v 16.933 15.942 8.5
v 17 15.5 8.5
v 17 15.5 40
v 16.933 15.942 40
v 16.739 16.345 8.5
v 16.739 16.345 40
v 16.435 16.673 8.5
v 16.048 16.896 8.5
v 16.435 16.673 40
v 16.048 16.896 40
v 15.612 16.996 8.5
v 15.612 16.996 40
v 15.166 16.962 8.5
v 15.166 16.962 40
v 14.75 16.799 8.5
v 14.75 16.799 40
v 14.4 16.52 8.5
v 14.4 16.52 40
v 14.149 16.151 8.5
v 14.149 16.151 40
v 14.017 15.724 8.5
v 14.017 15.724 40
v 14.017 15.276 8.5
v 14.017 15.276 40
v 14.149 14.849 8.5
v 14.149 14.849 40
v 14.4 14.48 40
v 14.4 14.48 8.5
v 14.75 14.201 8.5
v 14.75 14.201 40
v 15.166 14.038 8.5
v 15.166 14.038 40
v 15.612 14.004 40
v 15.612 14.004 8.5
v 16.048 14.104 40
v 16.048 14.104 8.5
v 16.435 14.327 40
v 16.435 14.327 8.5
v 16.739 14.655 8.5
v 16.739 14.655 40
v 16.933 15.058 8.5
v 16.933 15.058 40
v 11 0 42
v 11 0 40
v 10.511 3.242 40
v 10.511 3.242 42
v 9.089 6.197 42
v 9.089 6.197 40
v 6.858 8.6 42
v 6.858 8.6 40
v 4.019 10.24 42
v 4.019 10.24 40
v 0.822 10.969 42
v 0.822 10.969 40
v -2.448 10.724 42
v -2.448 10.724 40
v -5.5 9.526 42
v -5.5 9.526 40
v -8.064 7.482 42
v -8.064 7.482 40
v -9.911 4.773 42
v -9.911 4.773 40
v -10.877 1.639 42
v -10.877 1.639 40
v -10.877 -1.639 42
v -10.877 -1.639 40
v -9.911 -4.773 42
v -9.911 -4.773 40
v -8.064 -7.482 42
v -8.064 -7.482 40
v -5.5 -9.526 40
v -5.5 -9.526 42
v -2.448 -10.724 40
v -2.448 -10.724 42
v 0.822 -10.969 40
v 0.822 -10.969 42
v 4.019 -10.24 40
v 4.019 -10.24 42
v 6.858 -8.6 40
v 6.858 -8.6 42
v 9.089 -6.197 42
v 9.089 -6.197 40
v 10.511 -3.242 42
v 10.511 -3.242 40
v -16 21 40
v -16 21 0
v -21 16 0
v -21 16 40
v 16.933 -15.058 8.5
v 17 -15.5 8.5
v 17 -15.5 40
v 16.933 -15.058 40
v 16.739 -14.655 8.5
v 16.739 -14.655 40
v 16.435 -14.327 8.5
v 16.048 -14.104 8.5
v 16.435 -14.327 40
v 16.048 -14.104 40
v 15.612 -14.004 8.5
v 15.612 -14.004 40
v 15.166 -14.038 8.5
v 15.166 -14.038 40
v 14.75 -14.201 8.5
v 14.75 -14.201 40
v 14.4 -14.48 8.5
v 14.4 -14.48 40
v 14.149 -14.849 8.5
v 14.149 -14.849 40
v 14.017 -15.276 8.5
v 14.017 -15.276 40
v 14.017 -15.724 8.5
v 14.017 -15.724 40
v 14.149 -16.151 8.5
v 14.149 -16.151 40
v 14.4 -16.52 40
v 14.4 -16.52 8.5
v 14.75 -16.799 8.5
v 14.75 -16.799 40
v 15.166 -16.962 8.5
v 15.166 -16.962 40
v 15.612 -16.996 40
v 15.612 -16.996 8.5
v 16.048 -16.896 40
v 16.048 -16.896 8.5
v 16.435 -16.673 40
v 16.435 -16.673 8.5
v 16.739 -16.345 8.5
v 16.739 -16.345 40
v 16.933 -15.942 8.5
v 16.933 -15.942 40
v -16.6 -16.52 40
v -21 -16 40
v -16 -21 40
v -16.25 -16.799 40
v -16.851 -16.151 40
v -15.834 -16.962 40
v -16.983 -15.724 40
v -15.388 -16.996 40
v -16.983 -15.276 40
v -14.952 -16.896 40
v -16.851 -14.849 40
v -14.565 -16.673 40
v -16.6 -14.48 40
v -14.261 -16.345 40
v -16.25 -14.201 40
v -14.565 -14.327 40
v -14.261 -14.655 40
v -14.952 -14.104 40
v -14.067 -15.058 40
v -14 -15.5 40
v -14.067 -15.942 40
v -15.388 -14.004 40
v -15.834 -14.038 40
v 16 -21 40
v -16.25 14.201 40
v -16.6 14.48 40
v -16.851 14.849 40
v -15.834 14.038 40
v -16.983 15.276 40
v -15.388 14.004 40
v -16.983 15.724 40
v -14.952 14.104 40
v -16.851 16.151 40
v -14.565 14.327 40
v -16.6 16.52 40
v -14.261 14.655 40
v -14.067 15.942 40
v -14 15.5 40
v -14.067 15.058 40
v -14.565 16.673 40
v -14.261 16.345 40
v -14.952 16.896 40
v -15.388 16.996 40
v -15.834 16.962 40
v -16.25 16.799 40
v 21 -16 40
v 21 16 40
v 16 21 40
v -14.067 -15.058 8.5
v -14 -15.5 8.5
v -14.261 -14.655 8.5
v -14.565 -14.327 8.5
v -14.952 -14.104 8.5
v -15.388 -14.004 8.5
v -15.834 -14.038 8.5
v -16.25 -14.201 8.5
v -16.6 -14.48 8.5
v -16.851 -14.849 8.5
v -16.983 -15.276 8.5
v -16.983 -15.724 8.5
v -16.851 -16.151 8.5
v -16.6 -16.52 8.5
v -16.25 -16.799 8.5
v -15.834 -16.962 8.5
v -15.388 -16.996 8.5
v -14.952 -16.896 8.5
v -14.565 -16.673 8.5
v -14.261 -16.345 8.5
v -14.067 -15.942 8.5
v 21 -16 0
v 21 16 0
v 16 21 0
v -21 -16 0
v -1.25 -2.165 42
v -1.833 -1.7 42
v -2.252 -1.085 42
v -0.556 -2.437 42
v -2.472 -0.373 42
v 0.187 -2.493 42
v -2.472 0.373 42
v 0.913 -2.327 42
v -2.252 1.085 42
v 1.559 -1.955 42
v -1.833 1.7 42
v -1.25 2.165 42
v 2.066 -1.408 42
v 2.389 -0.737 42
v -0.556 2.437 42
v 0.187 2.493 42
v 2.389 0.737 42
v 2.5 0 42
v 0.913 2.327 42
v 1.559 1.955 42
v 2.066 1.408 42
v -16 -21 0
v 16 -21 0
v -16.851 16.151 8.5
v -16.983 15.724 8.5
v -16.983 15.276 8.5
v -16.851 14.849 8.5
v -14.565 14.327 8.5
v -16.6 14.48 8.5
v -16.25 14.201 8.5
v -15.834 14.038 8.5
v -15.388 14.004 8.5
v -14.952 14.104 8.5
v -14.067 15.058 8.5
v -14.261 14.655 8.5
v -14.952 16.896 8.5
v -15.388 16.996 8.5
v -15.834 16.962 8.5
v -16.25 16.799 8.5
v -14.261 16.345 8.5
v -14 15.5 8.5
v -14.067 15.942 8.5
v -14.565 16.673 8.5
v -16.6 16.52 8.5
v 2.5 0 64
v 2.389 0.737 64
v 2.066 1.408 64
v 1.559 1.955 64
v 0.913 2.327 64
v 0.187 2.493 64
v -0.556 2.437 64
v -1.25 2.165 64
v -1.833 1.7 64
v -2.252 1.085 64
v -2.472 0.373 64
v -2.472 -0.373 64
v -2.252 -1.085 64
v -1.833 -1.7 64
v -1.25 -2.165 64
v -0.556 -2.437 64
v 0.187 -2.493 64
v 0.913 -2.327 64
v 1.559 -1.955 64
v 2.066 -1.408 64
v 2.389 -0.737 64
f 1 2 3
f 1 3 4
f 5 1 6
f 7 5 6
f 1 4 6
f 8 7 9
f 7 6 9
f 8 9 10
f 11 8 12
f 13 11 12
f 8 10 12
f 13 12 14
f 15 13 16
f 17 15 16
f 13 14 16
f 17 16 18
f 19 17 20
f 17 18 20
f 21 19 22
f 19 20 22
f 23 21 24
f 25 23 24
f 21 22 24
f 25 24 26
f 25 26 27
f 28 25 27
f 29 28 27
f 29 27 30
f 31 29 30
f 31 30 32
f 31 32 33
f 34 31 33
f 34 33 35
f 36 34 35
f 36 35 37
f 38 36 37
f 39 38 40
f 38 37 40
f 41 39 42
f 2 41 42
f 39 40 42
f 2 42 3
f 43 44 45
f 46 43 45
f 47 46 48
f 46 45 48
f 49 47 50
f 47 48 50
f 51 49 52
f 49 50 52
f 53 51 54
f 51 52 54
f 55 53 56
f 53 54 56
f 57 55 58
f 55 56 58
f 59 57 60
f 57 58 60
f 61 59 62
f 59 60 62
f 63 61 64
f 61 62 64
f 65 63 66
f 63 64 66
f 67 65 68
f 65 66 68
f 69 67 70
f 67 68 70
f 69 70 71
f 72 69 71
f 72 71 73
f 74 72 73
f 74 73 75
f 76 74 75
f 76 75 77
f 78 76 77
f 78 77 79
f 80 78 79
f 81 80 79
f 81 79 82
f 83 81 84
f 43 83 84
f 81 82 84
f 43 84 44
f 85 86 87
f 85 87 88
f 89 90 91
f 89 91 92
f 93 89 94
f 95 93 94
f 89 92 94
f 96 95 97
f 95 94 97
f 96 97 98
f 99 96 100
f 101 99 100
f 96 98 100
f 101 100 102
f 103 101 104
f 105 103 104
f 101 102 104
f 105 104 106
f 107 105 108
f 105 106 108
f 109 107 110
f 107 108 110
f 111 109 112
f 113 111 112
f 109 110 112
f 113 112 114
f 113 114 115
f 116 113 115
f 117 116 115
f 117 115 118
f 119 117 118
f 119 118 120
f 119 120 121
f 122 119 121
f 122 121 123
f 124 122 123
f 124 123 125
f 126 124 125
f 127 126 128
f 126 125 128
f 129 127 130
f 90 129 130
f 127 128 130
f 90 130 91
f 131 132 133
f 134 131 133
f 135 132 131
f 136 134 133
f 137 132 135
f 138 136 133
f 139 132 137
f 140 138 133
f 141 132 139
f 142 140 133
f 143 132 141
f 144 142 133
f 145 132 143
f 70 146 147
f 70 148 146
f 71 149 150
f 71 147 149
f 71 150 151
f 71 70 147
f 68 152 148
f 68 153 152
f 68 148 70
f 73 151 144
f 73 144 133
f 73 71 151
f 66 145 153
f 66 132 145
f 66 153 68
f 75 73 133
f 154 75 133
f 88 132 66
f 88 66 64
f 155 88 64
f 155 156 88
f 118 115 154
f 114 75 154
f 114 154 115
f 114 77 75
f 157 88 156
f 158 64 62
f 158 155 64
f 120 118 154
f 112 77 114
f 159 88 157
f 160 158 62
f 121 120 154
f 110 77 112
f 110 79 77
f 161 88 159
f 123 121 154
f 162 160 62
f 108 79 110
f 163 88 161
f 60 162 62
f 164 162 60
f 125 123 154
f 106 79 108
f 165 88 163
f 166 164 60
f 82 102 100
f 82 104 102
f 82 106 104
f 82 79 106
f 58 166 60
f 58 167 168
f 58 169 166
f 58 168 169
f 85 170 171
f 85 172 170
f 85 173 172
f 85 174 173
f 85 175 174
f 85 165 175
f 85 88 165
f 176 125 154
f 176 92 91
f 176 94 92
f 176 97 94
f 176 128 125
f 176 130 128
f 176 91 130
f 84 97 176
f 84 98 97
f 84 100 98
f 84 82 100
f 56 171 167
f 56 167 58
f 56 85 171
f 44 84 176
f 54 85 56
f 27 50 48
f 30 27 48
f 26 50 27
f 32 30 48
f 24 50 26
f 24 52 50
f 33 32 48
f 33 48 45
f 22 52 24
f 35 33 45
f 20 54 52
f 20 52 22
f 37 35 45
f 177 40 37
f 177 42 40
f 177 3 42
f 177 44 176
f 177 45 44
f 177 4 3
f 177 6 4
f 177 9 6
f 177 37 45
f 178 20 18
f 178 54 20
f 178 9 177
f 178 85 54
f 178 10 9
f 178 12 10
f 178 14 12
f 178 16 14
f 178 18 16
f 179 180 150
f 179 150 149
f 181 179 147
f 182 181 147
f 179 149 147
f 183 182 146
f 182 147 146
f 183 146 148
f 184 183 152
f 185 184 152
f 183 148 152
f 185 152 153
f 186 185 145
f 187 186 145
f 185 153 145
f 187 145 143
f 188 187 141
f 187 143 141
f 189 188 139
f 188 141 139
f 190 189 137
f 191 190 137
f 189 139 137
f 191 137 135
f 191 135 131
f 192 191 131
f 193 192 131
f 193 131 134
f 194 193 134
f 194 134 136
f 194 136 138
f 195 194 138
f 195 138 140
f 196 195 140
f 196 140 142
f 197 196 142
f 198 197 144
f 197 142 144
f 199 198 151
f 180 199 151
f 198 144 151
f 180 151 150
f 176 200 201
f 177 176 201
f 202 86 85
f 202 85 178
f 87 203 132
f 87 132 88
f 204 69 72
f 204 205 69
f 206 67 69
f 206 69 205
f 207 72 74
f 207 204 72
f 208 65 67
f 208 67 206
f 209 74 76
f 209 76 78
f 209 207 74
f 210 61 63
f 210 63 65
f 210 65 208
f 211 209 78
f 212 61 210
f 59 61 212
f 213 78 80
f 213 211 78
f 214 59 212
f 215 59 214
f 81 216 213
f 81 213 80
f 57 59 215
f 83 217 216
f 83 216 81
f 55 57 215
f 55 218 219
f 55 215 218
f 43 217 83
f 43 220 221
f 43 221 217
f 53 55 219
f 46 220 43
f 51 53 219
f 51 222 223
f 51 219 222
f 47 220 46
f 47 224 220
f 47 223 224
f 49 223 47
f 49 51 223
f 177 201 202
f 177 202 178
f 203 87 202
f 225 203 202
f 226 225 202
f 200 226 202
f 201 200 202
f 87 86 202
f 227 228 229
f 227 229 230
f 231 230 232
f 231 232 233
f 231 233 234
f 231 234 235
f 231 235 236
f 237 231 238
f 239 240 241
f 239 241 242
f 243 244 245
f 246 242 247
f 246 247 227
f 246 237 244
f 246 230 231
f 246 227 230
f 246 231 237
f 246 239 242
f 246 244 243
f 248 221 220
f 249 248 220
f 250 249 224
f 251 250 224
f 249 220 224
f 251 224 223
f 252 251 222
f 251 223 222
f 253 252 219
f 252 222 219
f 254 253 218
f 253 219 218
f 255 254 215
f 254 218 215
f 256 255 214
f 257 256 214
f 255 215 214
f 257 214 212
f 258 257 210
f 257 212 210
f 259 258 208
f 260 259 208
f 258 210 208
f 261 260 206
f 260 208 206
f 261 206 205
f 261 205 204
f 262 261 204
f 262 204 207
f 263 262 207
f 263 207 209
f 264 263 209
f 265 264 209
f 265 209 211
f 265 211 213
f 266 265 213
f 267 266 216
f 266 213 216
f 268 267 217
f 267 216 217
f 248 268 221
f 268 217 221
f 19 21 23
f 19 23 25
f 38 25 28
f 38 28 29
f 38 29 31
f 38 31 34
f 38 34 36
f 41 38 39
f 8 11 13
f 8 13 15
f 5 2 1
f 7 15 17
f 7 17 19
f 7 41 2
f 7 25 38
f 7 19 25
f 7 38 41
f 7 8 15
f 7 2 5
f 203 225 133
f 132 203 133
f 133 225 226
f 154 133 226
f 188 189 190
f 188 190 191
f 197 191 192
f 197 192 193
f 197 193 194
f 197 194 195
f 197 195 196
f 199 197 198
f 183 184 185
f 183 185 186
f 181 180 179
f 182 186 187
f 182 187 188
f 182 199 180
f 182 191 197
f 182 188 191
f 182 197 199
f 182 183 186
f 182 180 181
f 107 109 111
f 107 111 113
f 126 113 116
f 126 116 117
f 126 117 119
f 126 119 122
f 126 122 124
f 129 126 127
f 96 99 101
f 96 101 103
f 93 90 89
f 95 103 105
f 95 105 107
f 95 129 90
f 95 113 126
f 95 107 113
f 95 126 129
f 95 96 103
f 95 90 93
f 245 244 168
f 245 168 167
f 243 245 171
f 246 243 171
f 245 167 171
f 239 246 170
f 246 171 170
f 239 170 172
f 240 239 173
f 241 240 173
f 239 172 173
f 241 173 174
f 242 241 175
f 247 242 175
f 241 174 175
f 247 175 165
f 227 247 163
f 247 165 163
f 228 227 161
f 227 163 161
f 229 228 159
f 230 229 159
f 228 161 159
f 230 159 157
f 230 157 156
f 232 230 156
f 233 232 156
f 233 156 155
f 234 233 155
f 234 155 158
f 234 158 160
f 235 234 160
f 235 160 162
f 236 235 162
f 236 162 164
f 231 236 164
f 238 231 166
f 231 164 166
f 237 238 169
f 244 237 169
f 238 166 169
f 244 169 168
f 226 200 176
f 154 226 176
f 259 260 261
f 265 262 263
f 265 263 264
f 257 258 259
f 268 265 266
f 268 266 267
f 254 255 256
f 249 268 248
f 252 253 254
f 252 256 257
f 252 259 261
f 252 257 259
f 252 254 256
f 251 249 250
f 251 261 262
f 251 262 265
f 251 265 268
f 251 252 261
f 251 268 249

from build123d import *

# Parameters (mm, degrees)
SKETCH_1_W          = 42
SKETCH_1_H          = 42
EXTRUDE_1_DEPTH     = 40
SKETCH_2_R          = 11
EXTRUDE_2_DEPTH     = 2
SKETCH_3_R          = 2.5
EXTRUDE_5_DEPTH     = 22
SKETCH_4_R          = 1.5
CUT_EXTRUDE_1_DEPTH = 31.5
CHAMFER_2_SIZE      = 5


with BuildPart() as part:
    # ｽｹｯﾁ1 → ﾎﾞｽ - 押し出し1 (new body)
    with BuildSketch(Plane.XY):
        Rectangle(SKETCH_1_W, SKETCH_1_H)
    extrude(amount=EXTRUDE_1_DEPTH)

    # ｽｹｯﾁ2 → ﾎﾞｽ - 押し出し2 (add)
    with BuildSketch(Plane.XY.offset(40)):
        Circle(SKETCH_2_R)
    extrude(amount=EXTRUDE_2_DEPTH)

    # ｽｹｯﾁ3 → ﾎﾞｽ - 押し出し5 (add)
    with BuildSketch(Plane.XY.offset(42)):
        Circle(SKETCH_3_R)
    extrude(amount=EXTRUDE_5_DEPTH)

    # ｽｹｯﾁ4 → ｶｯﾄ - 押し出し1 (cut)
    with BuildSketch(Plane.XY.offset(40)):
        with Locations((-15.5, 15.5)):
            Circle(SKETCH_4_R)
        with Locations((15.5, 15.5)):
            Circle(SKETCH_4_R)
        with Locations((15.5, -15.5)):
            Circle(SKETCH_4_R)
        with Locations((-15.5, -15.5)):
            Circle(SKETCH_4_R)
    extrude(amount=-CUT_EXTRUDE_1_DEPTH, mode=Mode.SUBTRACT)

    # 面取り2
    chamfer_2_edges = [part.edges().sort_by_distance(p)[0] for p in [
        (21, -21, 20),
        (-21, -21, 20),
        (-21, 21, 20),
        (21, 21, 20),
    ]]
    chamfer(chamfer_2_edges, length=CHAMFER_2_SIZE)


solid = part.part
